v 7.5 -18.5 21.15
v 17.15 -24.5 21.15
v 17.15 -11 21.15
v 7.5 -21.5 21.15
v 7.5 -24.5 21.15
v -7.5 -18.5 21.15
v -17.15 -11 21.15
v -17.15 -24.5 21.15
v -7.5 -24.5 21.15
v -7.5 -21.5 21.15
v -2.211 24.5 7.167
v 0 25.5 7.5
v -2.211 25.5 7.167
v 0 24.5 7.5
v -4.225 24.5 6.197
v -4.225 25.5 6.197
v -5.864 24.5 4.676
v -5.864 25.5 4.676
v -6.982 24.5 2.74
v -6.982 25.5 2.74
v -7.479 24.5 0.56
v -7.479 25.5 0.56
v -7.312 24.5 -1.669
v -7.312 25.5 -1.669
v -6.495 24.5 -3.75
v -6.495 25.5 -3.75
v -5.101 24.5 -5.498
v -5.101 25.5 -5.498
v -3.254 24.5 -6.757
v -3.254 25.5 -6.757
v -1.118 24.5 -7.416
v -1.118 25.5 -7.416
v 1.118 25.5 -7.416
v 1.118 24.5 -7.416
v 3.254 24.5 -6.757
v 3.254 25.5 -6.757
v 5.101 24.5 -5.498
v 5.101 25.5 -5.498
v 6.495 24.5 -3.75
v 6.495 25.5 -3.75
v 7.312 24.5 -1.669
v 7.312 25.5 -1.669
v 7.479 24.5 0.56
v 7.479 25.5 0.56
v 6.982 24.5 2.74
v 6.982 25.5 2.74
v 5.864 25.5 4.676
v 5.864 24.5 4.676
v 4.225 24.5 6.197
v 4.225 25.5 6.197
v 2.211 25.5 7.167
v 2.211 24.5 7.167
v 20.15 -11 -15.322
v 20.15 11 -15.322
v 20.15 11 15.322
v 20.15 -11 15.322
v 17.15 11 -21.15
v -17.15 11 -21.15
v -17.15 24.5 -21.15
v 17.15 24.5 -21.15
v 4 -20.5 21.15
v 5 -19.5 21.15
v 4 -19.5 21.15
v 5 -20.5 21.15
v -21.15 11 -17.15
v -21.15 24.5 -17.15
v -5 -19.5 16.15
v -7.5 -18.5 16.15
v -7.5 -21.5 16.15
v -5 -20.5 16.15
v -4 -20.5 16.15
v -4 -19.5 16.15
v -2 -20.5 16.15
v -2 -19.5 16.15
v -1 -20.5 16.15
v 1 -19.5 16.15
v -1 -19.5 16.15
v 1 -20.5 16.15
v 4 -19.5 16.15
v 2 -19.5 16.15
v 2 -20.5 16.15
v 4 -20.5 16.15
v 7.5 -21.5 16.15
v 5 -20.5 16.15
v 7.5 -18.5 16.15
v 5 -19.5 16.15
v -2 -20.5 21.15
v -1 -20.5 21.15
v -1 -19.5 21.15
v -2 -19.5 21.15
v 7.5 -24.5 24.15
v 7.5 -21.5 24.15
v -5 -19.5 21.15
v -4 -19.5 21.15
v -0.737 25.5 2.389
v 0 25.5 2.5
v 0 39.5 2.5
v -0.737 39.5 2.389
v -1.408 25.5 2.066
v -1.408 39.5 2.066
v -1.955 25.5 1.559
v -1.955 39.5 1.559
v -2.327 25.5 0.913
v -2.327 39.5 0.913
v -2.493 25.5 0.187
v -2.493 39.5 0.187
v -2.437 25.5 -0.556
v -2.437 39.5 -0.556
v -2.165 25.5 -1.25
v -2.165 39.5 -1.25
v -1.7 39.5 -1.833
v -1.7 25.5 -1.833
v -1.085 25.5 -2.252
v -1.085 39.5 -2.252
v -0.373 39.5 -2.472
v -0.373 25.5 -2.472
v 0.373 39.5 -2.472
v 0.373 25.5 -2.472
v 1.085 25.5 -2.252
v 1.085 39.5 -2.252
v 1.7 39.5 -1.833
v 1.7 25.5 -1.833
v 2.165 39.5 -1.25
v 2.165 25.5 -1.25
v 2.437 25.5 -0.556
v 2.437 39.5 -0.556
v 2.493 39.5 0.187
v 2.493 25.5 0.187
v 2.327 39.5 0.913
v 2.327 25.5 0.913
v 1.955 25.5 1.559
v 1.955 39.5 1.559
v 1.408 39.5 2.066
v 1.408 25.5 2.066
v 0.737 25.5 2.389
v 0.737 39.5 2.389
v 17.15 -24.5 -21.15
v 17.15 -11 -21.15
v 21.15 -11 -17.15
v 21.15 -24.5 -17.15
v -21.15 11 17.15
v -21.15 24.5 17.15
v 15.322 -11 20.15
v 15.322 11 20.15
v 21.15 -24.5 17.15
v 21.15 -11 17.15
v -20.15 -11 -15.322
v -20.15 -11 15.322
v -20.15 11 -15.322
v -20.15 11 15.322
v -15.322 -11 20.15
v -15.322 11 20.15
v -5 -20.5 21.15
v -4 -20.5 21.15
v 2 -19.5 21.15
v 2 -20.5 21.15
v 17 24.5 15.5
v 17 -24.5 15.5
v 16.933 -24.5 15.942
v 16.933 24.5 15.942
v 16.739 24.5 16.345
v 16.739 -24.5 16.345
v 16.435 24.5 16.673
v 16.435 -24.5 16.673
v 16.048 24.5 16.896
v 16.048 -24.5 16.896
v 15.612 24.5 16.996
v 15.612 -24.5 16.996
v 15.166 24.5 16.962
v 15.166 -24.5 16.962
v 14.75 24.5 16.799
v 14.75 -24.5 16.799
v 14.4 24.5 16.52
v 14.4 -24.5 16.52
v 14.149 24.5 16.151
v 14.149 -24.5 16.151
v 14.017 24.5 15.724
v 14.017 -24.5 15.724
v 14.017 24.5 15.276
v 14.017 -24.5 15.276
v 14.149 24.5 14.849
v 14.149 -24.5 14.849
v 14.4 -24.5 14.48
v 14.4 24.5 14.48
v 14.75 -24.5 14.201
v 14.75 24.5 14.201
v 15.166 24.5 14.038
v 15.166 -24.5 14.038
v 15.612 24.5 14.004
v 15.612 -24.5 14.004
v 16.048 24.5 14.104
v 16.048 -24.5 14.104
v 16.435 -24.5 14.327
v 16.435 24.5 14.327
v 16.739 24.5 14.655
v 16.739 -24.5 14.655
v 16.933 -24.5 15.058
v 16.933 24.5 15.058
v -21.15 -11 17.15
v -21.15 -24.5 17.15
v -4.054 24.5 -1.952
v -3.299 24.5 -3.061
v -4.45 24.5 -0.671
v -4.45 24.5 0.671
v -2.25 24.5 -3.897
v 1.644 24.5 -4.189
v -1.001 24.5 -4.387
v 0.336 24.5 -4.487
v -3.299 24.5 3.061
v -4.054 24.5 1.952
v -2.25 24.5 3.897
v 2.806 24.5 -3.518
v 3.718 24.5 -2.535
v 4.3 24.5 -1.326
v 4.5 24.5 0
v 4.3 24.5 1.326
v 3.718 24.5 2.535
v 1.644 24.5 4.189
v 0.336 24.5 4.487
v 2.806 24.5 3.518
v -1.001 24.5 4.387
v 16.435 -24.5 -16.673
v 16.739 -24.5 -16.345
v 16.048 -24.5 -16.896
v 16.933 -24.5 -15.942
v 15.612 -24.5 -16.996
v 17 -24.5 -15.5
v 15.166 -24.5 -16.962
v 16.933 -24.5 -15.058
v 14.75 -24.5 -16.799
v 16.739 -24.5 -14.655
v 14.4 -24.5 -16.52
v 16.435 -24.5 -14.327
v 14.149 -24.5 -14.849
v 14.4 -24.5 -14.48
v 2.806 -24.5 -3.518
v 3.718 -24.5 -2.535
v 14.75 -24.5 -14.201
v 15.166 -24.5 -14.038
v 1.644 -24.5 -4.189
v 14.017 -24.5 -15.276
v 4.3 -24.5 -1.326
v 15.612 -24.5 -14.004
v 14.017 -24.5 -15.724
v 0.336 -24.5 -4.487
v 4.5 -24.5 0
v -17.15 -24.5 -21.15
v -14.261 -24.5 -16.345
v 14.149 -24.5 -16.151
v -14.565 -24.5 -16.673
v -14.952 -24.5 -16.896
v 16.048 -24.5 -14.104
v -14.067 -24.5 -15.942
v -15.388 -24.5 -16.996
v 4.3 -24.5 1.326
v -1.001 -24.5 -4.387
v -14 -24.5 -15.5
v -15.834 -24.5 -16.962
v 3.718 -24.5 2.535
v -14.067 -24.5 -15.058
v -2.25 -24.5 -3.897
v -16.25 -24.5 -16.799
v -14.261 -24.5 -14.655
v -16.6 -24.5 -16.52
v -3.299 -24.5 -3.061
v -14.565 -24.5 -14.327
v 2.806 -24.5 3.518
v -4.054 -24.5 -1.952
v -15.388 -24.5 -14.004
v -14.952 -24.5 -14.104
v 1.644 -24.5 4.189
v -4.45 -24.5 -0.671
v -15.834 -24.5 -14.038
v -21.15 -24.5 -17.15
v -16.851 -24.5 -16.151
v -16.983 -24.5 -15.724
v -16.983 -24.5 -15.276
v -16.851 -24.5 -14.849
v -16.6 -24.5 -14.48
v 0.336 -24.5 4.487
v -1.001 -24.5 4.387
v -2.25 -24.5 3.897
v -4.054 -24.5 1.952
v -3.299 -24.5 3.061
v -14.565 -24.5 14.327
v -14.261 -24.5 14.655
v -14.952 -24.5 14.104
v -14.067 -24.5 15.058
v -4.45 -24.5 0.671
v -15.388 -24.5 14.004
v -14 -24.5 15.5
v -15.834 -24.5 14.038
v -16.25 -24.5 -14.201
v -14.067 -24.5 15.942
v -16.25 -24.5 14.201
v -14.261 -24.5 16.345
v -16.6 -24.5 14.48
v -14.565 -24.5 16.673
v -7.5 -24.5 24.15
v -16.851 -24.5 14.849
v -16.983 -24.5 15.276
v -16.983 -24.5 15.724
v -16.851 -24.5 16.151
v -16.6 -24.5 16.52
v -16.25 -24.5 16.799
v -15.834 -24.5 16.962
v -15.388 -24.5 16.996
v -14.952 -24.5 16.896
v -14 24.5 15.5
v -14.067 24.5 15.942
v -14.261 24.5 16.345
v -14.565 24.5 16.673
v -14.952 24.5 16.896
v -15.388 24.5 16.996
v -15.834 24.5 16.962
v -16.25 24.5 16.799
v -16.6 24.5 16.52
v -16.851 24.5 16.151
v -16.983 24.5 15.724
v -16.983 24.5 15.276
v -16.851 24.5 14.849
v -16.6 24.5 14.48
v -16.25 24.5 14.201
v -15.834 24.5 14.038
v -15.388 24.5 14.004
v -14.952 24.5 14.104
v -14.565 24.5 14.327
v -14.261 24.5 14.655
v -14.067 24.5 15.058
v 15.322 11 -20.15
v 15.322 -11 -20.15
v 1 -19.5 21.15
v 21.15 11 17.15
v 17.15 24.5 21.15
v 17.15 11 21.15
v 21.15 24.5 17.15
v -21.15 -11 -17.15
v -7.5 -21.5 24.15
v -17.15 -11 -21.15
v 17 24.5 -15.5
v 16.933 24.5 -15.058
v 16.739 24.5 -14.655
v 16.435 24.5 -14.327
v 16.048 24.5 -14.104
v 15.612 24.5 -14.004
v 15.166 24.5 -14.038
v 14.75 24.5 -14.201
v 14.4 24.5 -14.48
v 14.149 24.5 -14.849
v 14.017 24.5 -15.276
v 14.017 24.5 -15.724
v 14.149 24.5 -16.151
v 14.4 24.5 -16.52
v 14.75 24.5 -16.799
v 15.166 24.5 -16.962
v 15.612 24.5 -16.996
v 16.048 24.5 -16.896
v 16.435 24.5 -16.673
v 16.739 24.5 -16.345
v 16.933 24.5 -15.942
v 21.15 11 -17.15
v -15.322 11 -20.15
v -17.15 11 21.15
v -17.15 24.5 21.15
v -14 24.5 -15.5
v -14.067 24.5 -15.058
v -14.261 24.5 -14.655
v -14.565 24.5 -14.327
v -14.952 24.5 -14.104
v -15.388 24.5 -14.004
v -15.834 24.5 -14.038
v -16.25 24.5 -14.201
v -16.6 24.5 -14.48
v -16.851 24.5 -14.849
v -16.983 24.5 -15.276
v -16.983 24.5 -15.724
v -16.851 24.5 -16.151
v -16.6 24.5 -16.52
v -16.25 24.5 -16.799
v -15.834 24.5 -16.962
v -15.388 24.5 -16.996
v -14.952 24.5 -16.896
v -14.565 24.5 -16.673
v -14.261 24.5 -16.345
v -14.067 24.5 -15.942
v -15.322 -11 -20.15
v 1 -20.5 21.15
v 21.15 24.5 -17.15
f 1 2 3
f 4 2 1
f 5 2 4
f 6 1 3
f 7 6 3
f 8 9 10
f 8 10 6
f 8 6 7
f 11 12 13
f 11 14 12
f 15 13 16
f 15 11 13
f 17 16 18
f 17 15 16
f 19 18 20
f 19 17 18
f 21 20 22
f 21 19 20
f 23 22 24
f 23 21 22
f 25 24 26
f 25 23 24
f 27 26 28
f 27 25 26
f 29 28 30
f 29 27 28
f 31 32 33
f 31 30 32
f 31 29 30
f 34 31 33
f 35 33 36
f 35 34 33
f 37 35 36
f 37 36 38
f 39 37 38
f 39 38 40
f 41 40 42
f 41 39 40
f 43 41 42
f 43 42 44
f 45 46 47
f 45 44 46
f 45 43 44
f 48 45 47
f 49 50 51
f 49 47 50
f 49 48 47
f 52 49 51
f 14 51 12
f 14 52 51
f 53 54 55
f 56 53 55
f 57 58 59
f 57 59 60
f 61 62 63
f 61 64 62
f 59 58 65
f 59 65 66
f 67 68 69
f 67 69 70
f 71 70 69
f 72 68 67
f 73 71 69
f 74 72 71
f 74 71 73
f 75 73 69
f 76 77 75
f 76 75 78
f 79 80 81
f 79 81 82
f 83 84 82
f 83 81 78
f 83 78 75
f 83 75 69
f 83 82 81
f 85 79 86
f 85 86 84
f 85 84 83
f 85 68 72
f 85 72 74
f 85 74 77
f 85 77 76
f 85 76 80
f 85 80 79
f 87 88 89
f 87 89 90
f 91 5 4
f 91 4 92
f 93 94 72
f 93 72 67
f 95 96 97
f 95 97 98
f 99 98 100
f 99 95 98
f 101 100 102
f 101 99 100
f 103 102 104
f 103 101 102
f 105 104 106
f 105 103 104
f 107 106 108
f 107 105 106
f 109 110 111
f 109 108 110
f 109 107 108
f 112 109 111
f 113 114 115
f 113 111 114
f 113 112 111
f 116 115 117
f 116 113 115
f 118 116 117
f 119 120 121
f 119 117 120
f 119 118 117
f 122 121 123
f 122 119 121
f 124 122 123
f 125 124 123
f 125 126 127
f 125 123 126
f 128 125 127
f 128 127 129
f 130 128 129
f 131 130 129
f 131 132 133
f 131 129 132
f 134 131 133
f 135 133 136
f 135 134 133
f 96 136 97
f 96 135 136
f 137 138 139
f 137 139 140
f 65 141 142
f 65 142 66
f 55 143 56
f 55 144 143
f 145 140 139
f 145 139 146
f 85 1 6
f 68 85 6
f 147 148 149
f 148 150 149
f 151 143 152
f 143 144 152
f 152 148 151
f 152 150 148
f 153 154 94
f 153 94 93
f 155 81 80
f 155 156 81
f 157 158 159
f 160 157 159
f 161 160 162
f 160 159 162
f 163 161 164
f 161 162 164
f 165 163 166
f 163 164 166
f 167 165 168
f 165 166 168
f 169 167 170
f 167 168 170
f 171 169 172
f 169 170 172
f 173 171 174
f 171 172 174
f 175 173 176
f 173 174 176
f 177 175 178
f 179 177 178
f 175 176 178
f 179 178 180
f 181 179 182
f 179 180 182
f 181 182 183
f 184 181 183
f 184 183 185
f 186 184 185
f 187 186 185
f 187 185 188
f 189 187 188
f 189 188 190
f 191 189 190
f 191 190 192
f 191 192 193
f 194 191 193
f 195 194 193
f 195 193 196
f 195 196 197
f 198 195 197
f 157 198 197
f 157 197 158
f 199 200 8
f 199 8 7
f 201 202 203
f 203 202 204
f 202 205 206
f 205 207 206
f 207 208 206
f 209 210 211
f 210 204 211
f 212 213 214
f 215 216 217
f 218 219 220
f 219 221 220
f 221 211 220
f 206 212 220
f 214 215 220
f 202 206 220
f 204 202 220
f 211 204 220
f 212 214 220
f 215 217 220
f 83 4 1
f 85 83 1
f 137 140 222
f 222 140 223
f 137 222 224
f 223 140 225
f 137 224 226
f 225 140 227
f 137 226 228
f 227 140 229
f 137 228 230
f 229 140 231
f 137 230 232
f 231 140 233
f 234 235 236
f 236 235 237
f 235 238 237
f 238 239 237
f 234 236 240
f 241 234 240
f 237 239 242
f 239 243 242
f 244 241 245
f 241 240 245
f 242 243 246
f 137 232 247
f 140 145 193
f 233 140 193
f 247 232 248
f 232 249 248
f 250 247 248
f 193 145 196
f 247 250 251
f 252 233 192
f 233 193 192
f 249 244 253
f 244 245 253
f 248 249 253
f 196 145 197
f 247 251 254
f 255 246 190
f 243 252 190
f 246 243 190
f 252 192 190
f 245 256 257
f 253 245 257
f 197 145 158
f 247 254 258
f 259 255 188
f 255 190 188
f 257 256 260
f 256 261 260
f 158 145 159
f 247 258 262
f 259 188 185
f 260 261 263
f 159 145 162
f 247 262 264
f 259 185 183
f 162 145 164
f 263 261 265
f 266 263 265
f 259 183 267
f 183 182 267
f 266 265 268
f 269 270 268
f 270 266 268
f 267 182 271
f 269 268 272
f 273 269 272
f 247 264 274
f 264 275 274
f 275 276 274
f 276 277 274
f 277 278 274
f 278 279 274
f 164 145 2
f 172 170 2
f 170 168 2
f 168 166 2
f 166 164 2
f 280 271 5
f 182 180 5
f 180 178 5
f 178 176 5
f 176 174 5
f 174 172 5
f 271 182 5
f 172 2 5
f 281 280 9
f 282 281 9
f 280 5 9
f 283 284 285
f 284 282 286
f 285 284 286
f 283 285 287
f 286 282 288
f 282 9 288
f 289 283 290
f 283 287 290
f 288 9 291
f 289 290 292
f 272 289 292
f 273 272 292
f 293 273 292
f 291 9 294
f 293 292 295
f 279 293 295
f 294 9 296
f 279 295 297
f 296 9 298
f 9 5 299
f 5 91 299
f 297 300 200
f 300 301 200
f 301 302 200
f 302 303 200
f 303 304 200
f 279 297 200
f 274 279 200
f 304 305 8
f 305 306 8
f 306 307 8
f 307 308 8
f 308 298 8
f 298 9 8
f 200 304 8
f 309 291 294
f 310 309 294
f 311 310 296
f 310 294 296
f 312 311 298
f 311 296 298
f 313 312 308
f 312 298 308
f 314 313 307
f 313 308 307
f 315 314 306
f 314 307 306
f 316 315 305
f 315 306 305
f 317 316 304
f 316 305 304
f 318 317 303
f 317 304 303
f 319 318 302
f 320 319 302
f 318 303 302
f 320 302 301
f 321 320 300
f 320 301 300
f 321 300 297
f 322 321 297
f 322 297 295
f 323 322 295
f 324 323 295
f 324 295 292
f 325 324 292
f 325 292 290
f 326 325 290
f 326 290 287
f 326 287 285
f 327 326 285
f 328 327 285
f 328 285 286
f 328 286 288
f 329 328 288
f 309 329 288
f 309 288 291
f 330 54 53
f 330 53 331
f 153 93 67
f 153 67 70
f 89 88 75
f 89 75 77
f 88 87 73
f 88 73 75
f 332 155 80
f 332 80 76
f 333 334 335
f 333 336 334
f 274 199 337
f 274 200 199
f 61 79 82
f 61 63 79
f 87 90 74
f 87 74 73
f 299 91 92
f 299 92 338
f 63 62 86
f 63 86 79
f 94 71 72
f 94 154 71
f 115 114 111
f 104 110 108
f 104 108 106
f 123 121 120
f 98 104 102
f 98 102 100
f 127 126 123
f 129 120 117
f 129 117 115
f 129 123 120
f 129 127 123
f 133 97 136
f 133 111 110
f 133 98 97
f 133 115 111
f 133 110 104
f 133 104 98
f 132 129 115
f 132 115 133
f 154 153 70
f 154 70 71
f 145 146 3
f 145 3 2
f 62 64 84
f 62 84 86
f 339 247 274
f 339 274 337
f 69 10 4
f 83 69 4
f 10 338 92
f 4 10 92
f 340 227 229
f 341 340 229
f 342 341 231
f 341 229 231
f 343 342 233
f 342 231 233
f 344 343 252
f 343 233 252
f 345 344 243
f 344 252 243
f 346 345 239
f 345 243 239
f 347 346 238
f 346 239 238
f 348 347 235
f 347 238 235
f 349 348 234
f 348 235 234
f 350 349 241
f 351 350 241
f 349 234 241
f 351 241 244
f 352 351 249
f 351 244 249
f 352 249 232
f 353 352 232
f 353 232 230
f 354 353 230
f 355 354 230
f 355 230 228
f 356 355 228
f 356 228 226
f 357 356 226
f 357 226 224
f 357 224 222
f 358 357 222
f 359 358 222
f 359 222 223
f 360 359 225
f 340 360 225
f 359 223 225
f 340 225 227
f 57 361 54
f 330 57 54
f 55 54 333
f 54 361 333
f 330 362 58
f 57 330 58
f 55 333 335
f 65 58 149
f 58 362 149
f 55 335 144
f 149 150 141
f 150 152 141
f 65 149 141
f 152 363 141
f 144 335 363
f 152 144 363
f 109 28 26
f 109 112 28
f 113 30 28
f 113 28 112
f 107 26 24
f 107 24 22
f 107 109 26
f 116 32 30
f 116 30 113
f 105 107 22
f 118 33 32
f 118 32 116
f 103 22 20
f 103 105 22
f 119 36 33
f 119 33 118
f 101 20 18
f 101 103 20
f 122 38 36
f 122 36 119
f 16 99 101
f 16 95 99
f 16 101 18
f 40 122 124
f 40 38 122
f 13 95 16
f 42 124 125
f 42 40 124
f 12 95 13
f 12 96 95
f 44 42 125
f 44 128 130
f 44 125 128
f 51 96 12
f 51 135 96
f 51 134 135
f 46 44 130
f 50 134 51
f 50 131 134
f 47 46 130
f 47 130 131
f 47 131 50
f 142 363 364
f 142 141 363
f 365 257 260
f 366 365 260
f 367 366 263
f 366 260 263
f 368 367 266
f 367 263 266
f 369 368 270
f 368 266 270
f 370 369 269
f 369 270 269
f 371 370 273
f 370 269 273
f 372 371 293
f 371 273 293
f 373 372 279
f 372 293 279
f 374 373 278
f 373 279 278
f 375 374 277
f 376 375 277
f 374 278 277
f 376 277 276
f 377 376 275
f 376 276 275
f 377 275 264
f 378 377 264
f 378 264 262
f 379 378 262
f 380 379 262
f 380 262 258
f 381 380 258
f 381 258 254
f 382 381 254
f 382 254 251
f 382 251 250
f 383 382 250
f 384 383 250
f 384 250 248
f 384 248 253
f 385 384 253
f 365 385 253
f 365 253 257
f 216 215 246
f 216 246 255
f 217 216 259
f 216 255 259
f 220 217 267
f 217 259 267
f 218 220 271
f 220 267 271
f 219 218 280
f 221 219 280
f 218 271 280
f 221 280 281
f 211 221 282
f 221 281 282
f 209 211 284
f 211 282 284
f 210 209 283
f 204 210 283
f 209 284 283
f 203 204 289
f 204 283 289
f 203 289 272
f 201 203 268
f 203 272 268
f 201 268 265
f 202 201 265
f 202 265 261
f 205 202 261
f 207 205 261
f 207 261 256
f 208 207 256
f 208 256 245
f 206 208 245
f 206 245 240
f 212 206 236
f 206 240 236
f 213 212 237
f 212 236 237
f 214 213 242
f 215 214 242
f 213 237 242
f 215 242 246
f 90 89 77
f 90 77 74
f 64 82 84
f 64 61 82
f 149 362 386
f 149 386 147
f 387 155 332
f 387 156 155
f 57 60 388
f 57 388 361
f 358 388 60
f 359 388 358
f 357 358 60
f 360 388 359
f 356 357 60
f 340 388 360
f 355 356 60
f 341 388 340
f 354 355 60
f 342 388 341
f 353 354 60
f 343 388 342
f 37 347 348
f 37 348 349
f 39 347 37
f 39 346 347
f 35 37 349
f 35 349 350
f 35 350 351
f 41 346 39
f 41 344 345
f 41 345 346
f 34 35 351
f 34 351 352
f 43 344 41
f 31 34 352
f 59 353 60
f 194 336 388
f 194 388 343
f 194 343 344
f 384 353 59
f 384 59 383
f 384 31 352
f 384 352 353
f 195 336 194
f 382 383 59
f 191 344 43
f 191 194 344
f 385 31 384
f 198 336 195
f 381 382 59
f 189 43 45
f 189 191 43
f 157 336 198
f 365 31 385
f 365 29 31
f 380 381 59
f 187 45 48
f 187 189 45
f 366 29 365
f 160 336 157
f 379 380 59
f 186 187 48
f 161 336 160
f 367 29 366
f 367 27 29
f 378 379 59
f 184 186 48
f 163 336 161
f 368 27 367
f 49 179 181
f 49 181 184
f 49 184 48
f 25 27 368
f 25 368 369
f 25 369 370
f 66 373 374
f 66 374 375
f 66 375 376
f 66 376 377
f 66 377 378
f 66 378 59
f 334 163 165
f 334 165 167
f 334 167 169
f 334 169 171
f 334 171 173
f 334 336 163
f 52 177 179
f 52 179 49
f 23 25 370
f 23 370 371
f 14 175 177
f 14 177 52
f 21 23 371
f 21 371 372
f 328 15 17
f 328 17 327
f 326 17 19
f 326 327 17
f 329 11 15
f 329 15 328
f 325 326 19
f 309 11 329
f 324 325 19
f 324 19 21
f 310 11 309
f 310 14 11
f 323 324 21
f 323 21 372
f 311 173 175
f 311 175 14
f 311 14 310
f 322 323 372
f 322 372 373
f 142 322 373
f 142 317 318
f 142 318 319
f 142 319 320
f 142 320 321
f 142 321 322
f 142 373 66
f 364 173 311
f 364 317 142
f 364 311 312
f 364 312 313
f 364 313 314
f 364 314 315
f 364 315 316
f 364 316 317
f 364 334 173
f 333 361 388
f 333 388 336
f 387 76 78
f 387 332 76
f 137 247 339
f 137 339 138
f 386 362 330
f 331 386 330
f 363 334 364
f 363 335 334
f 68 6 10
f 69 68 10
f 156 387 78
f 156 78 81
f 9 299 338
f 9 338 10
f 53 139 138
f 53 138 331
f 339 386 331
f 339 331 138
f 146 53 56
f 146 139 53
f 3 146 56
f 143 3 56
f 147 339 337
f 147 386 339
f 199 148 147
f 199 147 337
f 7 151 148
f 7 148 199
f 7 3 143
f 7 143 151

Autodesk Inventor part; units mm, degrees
ref_plane "YZ Plane" through (0, 0, 0) normal (1, 0, 0) x (0, 1, 0)
ref_plane "XZ Plane" through (0, 0, 0) normal (0, 1, 0) x (-1, 0, 0)
ref_plane "XY Plane" through (0, 0, 0) normal (0, 0, 1) x (1, 0, 0)
sketch "Skizze1" plane through (0, 0, 0) normal (0, 1, 0) x (-1, 0, 0)
  line L0 (-21.15, 21.15) -> (21.15, 21.15)
  line L1 (21.15, 21.15) -> (21.15, -21.15)
  line L2 (21.15, -21.15) -> (-21.15, -21.15)
  line L3 (-21.15, -21.15) -> (-21.15, 21.15)
  line L4 (-21.15, 21.15) -> (21.15, -21.15) construction
  line L5 (21.15, 21.15) -> (-21.15, -21.15) construction
  point P0 (0, 0)
  dimension "d0" = 42.3
  dimension "d1" = 42.3
extrude "Extrusion1" add sketch "Skizze1" along normal mid plane 49
sketch "Skizze2" plane through (0, -24.5, 0) normal (0, -1, 0) x (1, 0, 0)
  line L0 (-21.15, 21.15) -> (21.15, 21.15) projected
  line L1 (-7.5, 21.15) -> (7.5, 21.15)
  line L2 (7.5, 21.15) -> (7.5, 24.15)
  line L3 (7.5, 24.15) -> (-7.5, 24.15)
  line L4 (-7.5, 24.15) -> (-7.5, 21.15)
  line L5 (0, -30.21) -> (0, 33.21) projected
  point P0 (0, 0)
  dimension "d4" = 15
  dimension "d5" = 3
extrude "Extrusion2" add sketch "Skizze2" against normal blind 3
sketch "Skizze3" plane through (0, -24.5, 0) normal (0, -1, 0) x (1, 0, 0)
  line L0 (-15.5, -15.5) -> (15.5, -15.5)
  line L1 (15.5, -15.5) -> (15.5, 15.5)
  line L2 (15.5, 15.5) -> (-15.5, 15.5)
  line L3 (-15.5, 15.5) -> (-15.5, -15.5)
  line L4 (-15.5, -15.5) -> (15.5, 15.5) construction
  line L5 (15.5, -15.5) -> (-15.5, 15.5) construction
  circle A0 centre (-15.5, 15.5) radius 1.5
  circle A1 centre (15.5, 15.5) radius 1.5
  circle A2 centre (15.5, -15.5) radius 1.5
  circle A3 centre (-15.5, -15.5) radius 1.5
  circle A4 centre (0, 0) radius 4.5
  dimension "d8" = 31
  dimension "d9" = 31
  dimension "d10" = 3
  dimension "d11" = 9
extrude "Extrusion3" cut sketch "Skizze3" along normal through all both and the other way through all contours L3 A3 L0 | L0 A3 L3 | A2 L1 L0 | L0 L1 A2 | A0 L2 L3 | L3 L2 A0 | A1 L2 L1 | L1 L2 A1 | A4
chamfer "Fase1" distance 4 angle 45 4 edges at (21.15, 0, 21.15) (-21.15, 0, 21.15) (21.15, 0, -21.15) (-21.15, 0, -21.15)
sketch "Skizze4" plane through (0, 0, 0) normal (0, 1, 0) x (-1, 0, 0)
  line L0 (20.15, 15.3216) -> (15.3216, 20.15)
  line L1 (-15.3216, 20.15) -> (-20.15, 15.3216)
  line L2 (-20.15, -15.3216) -> (-15.3216, -20.15)
  line L3 (15.3216, -20.15) -> (20.15, -15.3216)
  line L4 (25.5, -25.5) -> (-25.5, -25.5)
  line L5 (-25.5, -25.5) -> (-25.5, 25.5)
  line L6 (-25.5, 25.5) -> (25.5, 25.5)
  line L7 (25.5, 25.5) -> (25.5, -25.5)
  line L8 (25.5, -25.5) -> (-25.5, 25.5) construction
  line L9 (-25.5, -25.5) -> (25.5, 25.5) construction
  line L10 (-21.15, 17.15) -> (-17.15, 21.15) projected
  line L11 (-17.15, -21.15) -> (-21.15, -17.15) projected
  line L12 (21.15, -17.15) -> (17.15, -21.15) projected
  line L13 (17.15, 21.15) -> (21.15, 17.15) projected
  line L14 (20.15, 15.3216) -> (20.15, -15.3216)
  line L15 (15.3216, -20.15) -> (-15.3216, -20.15)
  line L16 (-20.15, -15.3216) -> (-20.15, 15.3216)
  line L17 (-15.3216, 20.15) -> (15.3216, 20.15)
  line L18 (17.15, 21.15) -> (-17.15, 21.15) projected
  line L19 (-21.15, 17.15) -> (-21.15, -17.15) projected
  line L20 (-17.15, -21.15) -> (17.15, -21.15) projected
  line L21 (21.15, -17.15) -> (21.15, 17.15) projected
  point P0 (0, 0)
  dimension "d21" = 2
  dimension "d22" = 1
  dimension "d24" = 1
  dimension "d25" = 1
extrude "Extrusion4" cut sketch "Skizze4" along normal mid plane 22 contours L4 L5 L6 L7 | L10 L18 L13 L21 L12 L20 L11 L19
sketch "Skizze6" plane through (-7.5, -21.5, 21.15) normal (0, 0, 1) x (1, 0, 0)
  line L0 (0, 0) -> (15, 0)
  line L1 (15, 0) -> (15, 3)
  line L2 (15, 3) -> (0, 3)
  line L3 (0, 3) -> (0, 0)
  line L4 (15, -3) -> (15, 0) projected
  line L5 (0, -3) -> (0, 0) projected
  line L6 (0, 0) -> (15, 0) projected
  line L7 (2.5, 1) -> (3.5, 1)
  line L8 (3.5, 1) -> (3.5, 2)
  line L9 (3.5, 2) -> (2.5, 2)
  line L10 (2.5, 2) -> (2.5, 1)
  line L11 (2.5, 1) -> (3.5, 2) construction
  line L12 (3.5, 1) -> (2.5, 2) construction
  line L13 (5.5, 1) -> (6.5, 1)
  line L14 (6.5, 1) -> (6.5, 2)
  line L15 (6.5, 2) -> (5.5, 2)
  line L16 (5.5, 2) -> (5.5, 1)
  line L17 (5.5, 1) -> (6.5, 2) construction
  line L18 (6.5, 1) -> (5.5, 2) construction
  line L19 (8.5, 1) -> (9.5, 1)
  line L20 (9.5, 1) -> (9.5, 2)
  line L21 (9.5, 2) -> (8.5, 2)
  line L22 (8.5, 2) -> (8.5, 1)
  line L23 (8.5, 1) -> (9.5, 2) construction
  line L24 (9.5, 1) -> (8.5, 2) construction
  line L25 (11.5, 1) -> (12.5, 1)
  line L26 (12.5, 1) -> (12.5, 2)
  line L27 (12.5, 2) -> (11.5, 2)
  line L28 (11.5, 2) -> (11.5, 1)
  line L29 (11.5, 1) -> (12.5, 2) construction
  line L30 (12.5, 1) -> (11.5, 2) construction
  line L31 (7.5, -12.8) -> (7.5, 55.8) projected
  point P0 (7.5, 21.5)
  point P1 (3, 1.5)
  point P2 (6, 1.5)
  point P3 (9, 1.5)
  point P4 (12, 1.5)
  point P5 (12, 1.5)
  point P6 (15, 1.5)
  dimension "d29" = 3
  dimension "d30" = 3
  dimension "d31" = 3
  dimension "d32" = 1
  dimension "d33" = 1
extrude "Extrusion6" cut sketch "Skizze6" against normal blind 5
sketch "Skizze7" plane through (0, 0, 0) normal (1, 0, 0) x (0, 1, 0)
  line L0 (39.5, 0) -> (39.5, 2.5)
  line L1 (39.5, 2.5) -> (25.5, 2.5)
  line L2 (25.5, 2.5) -> (25.5, 7.5)
  line L3 (25.5, 7.5) -> (24.5, 7.5)
  line L4 (24.5, -17.15) -> (24.5, 17.15) projected
  line L5 (24.5, 0) -> (39.5, 0)
  line L6 (24.5, 0) -> (24.5, 7.5)
  line L7 (38.5419, 0) -> (33.7383, 0)
  point P0 (0, 0)
  dimension "d37" = 5
  dimension "d38" = 1
  dimension "d39" = 15
  dimension "d40" = 15
revolve "Umdrehung1" add sketch "Skizze7" angle 360 about axis through (0, 24.5, 0) along (0, 1, 0)
equation "\"d24\" = d22"
equation "\"d25\" = d22"
equation "\"d31\" = d30"
equation "\"d33\" = d32"
properties part number "Nema17drylin"
